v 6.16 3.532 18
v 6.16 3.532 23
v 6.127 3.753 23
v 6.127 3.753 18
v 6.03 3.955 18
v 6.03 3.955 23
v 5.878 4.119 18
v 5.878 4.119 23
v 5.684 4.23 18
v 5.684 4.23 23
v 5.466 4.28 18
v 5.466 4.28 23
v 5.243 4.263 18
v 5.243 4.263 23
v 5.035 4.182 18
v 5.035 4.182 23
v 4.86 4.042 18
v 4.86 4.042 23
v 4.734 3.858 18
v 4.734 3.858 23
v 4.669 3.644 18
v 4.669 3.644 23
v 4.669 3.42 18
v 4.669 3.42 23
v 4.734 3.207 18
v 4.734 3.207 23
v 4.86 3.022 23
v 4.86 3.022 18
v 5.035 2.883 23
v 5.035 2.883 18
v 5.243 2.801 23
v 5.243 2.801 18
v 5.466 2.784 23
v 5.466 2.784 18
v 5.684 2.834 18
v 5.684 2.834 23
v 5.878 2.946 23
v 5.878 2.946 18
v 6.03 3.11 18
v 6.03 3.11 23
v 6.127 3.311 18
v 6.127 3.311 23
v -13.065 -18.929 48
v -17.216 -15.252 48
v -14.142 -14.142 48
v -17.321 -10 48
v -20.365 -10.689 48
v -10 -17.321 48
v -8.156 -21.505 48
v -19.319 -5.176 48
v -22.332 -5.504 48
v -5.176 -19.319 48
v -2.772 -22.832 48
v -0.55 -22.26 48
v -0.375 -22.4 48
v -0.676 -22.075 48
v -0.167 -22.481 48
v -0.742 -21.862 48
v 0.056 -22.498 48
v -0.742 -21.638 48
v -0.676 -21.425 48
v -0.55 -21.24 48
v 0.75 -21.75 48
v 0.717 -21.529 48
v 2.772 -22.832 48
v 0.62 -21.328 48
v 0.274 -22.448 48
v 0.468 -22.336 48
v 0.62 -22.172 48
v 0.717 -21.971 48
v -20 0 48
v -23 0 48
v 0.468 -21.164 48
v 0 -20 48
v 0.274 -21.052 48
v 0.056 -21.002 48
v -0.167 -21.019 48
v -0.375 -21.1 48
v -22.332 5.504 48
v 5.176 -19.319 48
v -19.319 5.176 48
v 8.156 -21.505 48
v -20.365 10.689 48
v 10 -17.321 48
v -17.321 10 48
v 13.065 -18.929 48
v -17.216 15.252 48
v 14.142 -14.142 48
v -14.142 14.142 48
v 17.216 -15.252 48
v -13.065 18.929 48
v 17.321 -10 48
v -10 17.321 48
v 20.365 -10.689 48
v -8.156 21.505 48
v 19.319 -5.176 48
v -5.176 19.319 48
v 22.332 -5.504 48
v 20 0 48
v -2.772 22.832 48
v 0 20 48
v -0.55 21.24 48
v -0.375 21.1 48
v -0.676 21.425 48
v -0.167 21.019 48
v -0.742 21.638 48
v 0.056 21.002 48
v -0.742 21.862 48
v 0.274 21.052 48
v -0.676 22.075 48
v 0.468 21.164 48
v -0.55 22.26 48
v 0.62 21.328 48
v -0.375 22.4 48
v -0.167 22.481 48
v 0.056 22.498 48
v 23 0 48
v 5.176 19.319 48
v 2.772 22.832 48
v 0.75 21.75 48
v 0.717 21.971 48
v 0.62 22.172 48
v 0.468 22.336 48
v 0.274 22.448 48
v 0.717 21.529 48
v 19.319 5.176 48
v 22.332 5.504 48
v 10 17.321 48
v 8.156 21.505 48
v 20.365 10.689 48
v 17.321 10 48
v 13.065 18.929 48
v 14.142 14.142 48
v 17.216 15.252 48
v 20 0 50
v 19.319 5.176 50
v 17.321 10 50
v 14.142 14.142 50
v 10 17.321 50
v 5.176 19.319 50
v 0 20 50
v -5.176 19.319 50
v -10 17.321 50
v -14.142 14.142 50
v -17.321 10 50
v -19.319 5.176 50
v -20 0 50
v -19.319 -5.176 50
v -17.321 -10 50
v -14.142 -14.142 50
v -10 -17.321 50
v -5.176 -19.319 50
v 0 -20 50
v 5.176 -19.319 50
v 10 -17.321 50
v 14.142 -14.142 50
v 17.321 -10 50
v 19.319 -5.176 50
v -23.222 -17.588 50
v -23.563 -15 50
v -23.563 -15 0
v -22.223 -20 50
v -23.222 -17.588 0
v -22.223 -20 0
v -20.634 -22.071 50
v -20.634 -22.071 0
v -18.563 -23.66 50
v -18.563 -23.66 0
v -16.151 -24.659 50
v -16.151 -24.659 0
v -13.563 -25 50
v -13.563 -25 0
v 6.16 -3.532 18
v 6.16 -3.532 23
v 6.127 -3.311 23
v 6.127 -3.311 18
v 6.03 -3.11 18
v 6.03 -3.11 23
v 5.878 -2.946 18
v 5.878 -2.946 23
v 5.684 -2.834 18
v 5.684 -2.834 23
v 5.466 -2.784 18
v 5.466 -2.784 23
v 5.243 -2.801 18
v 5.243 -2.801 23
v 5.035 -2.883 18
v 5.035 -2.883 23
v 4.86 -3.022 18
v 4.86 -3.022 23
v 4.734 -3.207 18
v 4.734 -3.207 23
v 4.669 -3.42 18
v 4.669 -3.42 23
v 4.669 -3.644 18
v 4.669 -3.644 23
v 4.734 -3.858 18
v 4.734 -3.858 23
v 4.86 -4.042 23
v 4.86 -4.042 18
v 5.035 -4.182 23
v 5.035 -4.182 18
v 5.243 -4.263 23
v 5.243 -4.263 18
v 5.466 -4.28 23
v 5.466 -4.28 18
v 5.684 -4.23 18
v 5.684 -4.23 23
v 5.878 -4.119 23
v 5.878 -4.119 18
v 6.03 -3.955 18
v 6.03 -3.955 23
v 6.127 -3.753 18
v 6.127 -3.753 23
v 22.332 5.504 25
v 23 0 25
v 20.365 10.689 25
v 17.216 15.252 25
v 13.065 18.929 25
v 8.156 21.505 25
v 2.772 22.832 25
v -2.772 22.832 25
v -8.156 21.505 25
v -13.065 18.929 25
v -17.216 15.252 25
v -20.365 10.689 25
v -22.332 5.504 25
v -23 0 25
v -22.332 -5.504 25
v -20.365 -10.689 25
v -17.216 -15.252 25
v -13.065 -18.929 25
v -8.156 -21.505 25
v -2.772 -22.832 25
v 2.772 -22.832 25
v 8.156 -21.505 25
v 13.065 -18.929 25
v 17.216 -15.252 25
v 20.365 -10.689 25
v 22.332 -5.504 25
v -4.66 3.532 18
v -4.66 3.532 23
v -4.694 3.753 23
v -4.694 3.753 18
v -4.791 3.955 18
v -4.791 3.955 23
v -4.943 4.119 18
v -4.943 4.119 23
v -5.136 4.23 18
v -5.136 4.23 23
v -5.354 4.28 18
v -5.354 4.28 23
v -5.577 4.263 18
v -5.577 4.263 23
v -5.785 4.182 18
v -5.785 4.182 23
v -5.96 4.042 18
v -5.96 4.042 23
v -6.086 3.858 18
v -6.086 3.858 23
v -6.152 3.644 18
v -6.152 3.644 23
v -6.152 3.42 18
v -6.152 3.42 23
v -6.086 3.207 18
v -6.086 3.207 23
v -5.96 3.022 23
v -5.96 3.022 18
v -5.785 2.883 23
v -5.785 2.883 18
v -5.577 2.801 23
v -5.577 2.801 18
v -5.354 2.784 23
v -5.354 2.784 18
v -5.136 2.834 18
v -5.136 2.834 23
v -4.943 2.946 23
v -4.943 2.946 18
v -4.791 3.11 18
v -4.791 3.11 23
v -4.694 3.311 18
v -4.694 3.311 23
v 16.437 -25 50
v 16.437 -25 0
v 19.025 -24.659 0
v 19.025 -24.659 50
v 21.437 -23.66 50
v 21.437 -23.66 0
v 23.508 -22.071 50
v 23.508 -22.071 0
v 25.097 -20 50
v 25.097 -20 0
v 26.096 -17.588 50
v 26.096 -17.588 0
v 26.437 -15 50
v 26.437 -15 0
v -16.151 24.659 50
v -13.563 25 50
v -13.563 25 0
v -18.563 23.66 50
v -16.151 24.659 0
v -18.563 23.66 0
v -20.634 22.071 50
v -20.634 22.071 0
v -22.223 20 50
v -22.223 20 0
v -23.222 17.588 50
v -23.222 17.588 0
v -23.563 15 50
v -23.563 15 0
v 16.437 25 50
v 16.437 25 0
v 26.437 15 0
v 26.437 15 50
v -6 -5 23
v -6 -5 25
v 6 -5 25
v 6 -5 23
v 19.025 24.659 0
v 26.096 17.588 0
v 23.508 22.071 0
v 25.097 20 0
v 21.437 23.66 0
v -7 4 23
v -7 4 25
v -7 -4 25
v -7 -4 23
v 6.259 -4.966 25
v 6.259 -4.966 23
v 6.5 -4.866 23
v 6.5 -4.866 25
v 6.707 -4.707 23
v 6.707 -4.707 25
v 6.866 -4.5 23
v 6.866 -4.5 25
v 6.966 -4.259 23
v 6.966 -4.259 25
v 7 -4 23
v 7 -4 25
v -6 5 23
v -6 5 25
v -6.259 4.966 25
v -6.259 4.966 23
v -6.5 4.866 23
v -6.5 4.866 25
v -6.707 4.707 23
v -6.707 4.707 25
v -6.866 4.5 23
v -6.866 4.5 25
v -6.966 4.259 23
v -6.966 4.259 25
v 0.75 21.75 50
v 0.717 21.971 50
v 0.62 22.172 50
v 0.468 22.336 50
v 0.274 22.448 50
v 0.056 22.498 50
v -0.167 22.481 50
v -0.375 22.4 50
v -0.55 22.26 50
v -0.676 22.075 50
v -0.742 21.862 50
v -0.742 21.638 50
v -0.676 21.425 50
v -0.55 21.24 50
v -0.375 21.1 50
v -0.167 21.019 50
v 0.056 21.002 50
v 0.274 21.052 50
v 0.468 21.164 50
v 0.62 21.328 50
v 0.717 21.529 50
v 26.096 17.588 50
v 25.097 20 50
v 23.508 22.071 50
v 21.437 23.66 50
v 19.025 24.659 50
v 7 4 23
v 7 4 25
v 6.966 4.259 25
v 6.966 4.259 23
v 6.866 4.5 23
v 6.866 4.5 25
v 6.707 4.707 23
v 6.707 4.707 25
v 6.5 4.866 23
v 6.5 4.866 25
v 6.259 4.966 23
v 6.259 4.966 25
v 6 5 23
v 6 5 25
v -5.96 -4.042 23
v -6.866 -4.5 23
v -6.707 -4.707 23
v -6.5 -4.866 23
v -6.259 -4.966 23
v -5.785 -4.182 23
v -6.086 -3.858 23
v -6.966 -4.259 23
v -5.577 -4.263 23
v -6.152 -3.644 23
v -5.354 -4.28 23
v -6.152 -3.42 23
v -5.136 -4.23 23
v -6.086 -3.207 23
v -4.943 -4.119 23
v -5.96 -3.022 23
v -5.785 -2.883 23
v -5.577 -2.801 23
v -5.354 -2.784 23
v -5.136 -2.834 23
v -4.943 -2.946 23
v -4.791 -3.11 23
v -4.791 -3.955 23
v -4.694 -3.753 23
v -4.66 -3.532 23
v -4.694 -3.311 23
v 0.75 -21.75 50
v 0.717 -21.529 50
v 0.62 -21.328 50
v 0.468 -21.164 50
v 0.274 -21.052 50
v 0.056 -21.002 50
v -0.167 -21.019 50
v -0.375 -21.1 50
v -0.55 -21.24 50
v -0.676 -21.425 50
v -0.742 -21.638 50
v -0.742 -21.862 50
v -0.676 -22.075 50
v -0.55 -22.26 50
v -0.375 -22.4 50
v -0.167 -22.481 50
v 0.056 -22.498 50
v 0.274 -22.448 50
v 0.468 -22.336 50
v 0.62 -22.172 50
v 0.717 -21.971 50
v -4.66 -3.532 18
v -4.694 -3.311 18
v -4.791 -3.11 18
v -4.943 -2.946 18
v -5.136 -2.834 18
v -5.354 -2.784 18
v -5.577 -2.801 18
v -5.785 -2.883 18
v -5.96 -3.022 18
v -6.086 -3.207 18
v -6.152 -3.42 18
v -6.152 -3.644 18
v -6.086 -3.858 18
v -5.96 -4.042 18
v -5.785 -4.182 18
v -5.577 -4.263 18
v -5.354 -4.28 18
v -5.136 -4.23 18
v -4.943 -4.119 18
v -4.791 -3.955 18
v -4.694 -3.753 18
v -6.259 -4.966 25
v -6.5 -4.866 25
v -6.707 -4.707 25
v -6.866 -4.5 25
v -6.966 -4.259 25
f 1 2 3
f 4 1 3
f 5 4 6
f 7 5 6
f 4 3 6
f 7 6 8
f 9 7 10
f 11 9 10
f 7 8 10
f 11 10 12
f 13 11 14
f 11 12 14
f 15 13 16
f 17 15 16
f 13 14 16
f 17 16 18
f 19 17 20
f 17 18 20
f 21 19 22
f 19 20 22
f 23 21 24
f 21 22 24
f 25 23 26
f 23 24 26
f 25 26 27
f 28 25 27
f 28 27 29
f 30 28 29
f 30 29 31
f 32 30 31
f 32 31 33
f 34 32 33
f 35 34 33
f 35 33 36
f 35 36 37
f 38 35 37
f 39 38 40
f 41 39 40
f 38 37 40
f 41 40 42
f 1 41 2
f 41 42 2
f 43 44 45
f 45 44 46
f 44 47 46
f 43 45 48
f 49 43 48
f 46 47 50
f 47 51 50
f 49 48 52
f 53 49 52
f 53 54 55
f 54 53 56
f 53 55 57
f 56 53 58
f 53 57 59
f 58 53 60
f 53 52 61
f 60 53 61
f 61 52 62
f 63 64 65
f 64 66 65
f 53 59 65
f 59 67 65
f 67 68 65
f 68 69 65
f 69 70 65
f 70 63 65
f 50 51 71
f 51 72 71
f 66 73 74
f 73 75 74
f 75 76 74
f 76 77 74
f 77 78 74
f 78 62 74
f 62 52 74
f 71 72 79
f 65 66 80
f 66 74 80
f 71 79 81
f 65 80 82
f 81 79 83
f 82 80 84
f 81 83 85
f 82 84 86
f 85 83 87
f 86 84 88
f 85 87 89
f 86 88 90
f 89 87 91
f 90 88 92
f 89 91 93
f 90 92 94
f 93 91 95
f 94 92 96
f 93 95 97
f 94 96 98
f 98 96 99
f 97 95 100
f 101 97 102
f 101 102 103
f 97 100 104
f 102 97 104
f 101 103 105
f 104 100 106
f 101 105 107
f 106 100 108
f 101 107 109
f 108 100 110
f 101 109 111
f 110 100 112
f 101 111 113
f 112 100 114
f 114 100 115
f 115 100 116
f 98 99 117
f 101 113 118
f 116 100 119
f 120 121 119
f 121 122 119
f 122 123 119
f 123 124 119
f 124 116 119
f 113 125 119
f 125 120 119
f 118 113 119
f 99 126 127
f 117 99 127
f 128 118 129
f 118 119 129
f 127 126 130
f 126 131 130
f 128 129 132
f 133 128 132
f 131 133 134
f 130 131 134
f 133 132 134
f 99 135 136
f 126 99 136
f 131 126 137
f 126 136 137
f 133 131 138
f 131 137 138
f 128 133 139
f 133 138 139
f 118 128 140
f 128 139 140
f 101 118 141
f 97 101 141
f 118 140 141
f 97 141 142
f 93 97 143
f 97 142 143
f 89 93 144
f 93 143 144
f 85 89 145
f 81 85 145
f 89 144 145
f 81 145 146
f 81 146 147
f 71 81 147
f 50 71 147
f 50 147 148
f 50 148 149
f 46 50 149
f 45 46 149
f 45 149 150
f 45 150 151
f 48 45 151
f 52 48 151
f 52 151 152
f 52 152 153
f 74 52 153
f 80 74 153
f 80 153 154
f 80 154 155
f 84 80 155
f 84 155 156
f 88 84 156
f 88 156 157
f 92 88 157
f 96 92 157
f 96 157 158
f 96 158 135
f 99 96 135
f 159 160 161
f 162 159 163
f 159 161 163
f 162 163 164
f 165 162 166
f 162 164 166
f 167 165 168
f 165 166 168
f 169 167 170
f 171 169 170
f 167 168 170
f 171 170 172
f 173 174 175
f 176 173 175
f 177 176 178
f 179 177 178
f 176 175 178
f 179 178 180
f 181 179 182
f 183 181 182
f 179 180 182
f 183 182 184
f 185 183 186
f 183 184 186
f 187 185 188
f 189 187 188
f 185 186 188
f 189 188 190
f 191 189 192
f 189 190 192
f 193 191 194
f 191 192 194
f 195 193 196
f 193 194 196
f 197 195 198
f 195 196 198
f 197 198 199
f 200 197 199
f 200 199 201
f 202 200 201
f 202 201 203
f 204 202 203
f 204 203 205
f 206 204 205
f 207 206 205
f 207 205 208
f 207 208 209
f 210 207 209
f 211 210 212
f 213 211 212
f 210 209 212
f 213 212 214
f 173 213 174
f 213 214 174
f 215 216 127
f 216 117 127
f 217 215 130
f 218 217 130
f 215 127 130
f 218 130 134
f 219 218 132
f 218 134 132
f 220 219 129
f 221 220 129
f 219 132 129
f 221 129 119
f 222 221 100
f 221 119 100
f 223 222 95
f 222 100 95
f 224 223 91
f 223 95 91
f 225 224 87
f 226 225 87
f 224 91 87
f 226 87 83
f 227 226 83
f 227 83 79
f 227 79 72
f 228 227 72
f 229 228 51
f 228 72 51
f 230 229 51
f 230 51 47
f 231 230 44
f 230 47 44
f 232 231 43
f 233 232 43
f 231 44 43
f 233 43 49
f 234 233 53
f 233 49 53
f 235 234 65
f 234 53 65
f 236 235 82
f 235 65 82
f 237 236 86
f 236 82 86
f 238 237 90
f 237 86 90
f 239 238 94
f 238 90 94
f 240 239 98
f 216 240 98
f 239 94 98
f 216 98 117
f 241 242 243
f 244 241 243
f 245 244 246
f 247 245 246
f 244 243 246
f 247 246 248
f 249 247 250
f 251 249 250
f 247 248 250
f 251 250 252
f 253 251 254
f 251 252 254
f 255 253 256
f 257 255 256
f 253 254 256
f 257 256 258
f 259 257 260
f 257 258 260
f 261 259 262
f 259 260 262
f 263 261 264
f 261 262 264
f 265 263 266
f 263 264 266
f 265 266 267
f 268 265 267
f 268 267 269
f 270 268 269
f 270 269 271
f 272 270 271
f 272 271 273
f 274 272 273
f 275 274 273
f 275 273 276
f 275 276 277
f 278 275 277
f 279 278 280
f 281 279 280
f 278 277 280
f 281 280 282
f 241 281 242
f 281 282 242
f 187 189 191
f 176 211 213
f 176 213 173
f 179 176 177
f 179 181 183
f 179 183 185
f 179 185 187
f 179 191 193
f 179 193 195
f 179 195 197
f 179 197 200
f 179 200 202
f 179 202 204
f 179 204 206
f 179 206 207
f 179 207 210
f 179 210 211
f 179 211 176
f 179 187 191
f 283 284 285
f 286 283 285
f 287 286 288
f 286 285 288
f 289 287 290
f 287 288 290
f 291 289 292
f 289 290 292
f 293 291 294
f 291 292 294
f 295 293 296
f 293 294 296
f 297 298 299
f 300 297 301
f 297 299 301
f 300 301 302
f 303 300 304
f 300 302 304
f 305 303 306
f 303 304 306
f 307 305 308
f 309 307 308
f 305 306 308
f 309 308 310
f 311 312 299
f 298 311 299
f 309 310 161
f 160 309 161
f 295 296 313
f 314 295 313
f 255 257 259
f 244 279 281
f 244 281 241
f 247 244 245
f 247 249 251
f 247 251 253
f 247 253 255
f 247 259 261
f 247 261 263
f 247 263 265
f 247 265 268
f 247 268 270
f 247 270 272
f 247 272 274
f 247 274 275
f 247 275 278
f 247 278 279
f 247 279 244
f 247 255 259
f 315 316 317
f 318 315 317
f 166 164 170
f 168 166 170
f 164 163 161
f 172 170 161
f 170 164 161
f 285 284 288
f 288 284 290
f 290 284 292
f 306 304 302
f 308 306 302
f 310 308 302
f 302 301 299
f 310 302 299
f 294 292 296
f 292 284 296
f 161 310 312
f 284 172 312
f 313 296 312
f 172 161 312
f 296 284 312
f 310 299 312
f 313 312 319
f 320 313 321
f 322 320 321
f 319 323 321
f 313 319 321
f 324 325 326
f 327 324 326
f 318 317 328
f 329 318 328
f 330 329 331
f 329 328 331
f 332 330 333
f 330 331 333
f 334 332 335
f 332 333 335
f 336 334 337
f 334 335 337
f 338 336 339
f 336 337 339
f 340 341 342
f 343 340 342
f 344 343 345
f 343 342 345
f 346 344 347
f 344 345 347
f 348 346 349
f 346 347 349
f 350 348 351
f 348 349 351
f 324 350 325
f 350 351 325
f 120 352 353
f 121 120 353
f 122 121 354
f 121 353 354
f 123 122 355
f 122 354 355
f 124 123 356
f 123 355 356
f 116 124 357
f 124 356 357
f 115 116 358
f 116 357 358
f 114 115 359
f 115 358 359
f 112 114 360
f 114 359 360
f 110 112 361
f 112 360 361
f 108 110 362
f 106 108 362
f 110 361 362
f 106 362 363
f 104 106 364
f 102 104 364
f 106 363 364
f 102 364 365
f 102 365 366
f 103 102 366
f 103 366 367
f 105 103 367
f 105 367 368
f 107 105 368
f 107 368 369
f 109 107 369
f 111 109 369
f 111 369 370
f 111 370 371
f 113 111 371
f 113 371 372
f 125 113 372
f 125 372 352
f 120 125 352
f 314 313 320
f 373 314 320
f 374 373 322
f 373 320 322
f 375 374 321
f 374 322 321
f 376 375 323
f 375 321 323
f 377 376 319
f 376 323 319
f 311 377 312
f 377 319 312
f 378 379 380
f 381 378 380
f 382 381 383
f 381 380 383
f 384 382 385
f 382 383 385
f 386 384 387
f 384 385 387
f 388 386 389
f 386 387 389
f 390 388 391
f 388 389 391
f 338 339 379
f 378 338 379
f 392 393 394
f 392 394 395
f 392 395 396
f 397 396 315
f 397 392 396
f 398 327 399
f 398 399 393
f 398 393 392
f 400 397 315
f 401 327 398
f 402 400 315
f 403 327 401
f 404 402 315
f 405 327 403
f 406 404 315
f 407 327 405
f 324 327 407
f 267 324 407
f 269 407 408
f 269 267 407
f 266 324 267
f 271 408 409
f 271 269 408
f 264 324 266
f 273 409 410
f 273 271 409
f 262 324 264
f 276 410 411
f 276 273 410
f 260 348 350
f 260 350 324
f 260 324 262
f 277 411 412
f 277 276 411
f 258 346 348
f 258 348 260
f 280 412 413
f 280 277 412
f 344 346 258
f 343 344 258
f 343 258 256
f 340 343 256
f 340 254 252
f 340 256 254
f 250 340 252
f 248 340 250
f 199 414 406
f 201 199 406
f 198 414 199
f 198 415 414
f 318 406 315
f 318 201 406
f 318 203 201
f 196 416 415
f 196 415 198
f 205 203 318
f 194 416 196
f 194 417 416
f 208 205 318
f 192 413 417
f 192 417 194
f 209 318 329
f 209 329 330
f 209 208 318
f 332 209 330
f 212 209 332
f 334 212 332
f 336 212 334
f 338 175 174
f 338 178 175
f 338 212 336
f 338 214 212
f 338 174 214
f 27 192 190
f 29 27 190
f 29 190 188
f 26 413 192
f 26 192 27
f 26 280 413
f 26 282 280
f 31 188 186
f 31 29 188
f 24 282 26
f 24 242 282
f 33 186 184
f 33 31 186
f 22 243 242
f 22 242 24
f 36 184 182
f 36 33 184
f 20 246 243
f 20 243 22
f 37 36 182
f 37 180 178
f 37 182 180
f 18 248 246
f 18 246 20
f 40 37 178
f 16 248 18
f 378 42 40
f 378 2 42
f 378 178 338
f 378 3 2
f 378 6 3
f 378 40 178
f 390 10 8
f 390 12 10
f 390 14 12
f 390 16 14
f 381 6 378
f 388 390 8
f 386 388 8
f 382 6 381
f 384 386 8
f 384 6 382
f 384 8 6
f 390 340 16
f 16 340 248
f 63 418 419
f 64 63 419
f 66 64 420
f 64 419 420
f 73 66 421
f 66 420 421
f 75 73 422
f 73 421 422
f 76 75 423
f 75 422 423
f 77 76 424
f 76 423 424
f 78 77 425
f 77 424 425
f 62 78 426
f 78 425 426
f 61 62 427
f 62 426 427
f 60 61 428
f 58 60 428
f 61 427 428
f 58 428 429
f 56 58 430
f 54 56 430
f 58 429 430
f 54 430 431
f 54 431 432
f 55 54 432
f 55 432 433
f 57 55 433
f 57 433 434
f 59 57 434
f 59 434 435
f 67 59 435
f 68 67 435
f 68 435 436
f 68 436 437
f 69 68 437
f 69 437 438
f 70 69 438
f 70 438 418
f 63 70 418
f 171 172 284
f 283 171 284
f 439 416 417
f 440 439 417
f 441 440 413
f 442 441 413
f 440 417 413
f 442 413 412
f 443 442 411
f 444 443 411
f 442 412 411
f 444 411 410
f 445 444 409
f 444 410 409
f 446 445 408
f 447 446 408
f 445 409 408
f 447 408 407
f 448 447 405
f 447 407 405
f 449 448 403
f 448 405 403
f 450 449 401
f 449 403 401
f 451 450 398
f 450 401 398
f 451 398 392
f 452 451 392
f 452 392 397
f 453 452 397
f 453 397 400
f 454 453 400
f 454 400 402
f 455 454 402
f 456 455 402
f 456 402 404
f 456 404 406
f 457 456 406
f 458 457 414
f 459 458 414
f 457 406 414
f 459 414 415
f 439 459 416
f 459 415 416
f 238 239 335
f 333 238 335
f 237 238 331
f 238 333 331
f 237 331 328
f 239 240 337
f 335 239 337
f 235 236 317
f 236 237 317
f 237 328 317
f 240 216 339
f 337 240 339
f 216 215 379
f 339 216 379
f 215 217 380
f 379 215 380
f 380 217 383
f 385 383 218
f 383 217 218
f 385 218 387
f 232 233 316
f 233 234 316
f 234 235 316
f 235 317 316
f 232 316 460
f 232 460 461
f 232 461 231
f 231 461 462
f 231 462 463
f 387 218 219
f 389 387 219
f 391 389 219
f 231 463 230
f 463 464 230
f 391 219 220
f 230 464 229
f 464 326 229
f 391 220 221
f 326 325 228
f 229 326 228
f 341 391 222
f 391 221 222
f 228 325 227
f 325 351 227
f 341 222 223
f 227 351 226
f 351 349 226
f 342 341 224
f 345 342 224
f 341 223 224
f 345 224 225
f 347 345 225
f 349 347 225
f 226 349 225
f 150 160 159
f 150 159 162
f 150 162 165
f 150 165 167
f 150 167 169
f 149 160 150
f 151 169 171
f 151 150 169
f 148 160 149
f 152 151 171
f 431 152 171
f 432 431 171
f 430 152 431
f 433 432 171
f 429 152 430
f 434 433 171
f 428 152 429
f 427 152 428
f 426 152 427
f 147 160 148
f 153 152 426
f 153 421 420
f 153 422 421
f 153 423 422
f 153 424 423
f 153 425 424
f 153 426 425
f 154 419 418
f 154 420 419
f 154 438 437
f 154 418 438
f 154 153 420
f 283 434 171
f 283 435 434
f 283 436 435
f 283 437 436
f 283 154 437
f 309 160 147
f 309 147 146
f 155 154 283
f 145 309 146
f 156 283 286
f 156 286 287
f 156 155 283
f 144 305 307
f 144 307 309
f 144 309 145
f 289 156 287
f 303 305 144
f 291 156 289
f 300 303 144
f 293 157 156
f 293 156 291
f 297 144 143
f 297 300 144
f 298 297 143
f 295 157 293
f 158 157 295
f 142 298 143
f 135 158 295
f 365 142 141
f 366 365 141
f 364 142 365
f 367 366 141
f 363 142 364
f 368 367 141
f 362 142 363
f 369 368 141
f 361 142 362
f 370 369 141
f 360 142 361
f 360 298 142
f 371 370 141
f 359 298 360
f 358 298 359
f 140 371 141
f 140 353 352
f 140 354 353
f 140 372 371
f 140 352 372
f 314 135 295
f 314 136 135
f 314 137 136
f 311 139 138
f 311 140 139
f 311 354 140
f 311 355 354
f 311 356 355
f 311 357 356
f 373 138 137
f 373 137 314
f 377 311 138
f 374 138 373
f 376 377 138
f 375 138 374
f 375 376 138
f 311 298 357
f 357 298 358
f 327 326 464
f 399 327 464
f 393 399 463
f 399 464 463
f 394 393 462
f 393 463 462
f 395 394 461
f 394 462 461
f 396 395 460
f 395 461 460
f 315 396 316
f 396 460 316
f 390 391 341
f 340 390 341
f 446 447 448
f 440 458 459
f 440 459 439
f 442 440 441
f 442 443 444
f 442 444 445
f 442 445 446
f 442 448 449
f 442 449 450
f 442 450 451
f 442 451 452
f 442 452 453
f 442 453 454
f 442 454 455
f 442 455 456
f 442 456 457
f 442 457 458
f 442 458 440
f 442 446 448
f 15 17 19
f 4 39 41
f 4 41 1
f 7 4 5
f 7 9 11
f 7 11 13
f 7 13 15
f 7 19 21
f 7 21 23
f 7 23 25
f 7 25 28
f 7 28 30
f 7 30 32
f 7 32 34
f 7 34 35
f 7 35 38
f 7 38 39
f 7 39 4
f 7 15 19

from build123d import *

# Parameters (mm, degrees)
F1_DEPTH  = 50
F2_R      = 20
F3_DEPTH  = 25
F6_R      = 0.75
F7_DEPTH  = 25
F9_DEPTH  = 2
F10_R     = 0.75
F11_DEPTH = 5


# Not quite as in the source:
# - the program builds the solid bodies; features that only make, move or delete a surface that nothing else refers to are left out


with BuildPart() as f1:
    # F0 (on Top) → F1 (new body)
    with BuildSketch(Plane.XY):
        with BuildLine():
            Line((16.436829567, 25), (-13.563170433, 25))
            ThreePointArc((-13.563170433, 25), (-20.6342382449, 22.0710678119), (-23.563170433, 15))
            Line((-23.563170433, 15), (-23.563170433, -15))
            ThreePointArc((-23.563170433, -15), (-20.6342382449, -22.0710678119), (-13.563170433, -25))
            Line((-13.563170433, -25), (16.436829567, -25))
            ThreePointArc((16.436829567, -25), (23.5078973788, -22.0710678119), (26.436829567, -15))
            Line((26.436829567, -15), (26.436829567, 15))
            ThreePointArc((26.436829567, 15), (23.5078973788, 22.0710678119), (16.436829567, 25))
        make_face()
    extrude(amount=F1_DEPTH)

    # F2 (on face) → F3 (cut)
    with BuildSketch(Plane.XY.offset(50)):
        Circle(F2_R)
    extrude(amount=-F3_DEPTH, mode=Mode.SUBTRACT)

    # F4 (on Front) → F5 (revolve, cut)
    with BuildSketch(Plane.XZ):
        Polygon((20, 48), (20, 50), (0, 50), (0, 25), (23, 25), (23, 48), align=None)
    revolve(axis=Axis((0, 0, 37.5), (0, 0, 1)), mode=Mode.SUBTRACT)

    # F6 (on face) → F7 (cut)
    with BuildSketch(Plane.XY.offset(50)):
        with Locations((0, 21.75)):
            Circle(F6_R)
        with Locations((0, -21.75)):
            Circle(F6_R)
    extrude(amount=-F7_DEPTH, mode=Mode.SUBTRACT)

    # F8 (on face) → F9 (cut)
    with BuildSketch(Plane.XY.offset(25)):
        with BuildLine():
            ThreePointArc((7, 4), (6.7071067812, 4.7071067812), (6, 5))
            Line((6, 5), (-6, 5))
            ThreePointArc((-6, 5), (-6.7071067812, 4.7071067812), (-7, 4))
            Line((-7, 4), (-7, -4))
            ThreePointArc((-7, -4), (-6.7071067812, -4.7071067812), (-6, -5))
            Line((-6, -5), (6, -5))
            ThreePointArc((6, -5), (6.7071067812, -4.7071067812), (7, -4))
            Line((7, -4), (7, 4))
        make_face()
    extrude(amount=-F9_DEPTH, mode=Mode.SUBTRACT)

    # F10 (on face) → F11 (cut)
    with BuildSketch(Plane.XY.offset(23)):
        with Locations((-5.4101994716, 3.5321465987)):
            Circle(F10_R)
        with Locations((-5.4101994716, -3.5321465987)):
            Circle(F10_R)
        with Locations((5.4101994716, 3.5321465987)):
            Circle(F10_R)
        with Locations((5.4101994716, -3.5321465987)):
            Circle(F10_R)
    extrude(amount=-F11_DEPTH, mode=Mode.SUBTRACT)


solid = f1.part
